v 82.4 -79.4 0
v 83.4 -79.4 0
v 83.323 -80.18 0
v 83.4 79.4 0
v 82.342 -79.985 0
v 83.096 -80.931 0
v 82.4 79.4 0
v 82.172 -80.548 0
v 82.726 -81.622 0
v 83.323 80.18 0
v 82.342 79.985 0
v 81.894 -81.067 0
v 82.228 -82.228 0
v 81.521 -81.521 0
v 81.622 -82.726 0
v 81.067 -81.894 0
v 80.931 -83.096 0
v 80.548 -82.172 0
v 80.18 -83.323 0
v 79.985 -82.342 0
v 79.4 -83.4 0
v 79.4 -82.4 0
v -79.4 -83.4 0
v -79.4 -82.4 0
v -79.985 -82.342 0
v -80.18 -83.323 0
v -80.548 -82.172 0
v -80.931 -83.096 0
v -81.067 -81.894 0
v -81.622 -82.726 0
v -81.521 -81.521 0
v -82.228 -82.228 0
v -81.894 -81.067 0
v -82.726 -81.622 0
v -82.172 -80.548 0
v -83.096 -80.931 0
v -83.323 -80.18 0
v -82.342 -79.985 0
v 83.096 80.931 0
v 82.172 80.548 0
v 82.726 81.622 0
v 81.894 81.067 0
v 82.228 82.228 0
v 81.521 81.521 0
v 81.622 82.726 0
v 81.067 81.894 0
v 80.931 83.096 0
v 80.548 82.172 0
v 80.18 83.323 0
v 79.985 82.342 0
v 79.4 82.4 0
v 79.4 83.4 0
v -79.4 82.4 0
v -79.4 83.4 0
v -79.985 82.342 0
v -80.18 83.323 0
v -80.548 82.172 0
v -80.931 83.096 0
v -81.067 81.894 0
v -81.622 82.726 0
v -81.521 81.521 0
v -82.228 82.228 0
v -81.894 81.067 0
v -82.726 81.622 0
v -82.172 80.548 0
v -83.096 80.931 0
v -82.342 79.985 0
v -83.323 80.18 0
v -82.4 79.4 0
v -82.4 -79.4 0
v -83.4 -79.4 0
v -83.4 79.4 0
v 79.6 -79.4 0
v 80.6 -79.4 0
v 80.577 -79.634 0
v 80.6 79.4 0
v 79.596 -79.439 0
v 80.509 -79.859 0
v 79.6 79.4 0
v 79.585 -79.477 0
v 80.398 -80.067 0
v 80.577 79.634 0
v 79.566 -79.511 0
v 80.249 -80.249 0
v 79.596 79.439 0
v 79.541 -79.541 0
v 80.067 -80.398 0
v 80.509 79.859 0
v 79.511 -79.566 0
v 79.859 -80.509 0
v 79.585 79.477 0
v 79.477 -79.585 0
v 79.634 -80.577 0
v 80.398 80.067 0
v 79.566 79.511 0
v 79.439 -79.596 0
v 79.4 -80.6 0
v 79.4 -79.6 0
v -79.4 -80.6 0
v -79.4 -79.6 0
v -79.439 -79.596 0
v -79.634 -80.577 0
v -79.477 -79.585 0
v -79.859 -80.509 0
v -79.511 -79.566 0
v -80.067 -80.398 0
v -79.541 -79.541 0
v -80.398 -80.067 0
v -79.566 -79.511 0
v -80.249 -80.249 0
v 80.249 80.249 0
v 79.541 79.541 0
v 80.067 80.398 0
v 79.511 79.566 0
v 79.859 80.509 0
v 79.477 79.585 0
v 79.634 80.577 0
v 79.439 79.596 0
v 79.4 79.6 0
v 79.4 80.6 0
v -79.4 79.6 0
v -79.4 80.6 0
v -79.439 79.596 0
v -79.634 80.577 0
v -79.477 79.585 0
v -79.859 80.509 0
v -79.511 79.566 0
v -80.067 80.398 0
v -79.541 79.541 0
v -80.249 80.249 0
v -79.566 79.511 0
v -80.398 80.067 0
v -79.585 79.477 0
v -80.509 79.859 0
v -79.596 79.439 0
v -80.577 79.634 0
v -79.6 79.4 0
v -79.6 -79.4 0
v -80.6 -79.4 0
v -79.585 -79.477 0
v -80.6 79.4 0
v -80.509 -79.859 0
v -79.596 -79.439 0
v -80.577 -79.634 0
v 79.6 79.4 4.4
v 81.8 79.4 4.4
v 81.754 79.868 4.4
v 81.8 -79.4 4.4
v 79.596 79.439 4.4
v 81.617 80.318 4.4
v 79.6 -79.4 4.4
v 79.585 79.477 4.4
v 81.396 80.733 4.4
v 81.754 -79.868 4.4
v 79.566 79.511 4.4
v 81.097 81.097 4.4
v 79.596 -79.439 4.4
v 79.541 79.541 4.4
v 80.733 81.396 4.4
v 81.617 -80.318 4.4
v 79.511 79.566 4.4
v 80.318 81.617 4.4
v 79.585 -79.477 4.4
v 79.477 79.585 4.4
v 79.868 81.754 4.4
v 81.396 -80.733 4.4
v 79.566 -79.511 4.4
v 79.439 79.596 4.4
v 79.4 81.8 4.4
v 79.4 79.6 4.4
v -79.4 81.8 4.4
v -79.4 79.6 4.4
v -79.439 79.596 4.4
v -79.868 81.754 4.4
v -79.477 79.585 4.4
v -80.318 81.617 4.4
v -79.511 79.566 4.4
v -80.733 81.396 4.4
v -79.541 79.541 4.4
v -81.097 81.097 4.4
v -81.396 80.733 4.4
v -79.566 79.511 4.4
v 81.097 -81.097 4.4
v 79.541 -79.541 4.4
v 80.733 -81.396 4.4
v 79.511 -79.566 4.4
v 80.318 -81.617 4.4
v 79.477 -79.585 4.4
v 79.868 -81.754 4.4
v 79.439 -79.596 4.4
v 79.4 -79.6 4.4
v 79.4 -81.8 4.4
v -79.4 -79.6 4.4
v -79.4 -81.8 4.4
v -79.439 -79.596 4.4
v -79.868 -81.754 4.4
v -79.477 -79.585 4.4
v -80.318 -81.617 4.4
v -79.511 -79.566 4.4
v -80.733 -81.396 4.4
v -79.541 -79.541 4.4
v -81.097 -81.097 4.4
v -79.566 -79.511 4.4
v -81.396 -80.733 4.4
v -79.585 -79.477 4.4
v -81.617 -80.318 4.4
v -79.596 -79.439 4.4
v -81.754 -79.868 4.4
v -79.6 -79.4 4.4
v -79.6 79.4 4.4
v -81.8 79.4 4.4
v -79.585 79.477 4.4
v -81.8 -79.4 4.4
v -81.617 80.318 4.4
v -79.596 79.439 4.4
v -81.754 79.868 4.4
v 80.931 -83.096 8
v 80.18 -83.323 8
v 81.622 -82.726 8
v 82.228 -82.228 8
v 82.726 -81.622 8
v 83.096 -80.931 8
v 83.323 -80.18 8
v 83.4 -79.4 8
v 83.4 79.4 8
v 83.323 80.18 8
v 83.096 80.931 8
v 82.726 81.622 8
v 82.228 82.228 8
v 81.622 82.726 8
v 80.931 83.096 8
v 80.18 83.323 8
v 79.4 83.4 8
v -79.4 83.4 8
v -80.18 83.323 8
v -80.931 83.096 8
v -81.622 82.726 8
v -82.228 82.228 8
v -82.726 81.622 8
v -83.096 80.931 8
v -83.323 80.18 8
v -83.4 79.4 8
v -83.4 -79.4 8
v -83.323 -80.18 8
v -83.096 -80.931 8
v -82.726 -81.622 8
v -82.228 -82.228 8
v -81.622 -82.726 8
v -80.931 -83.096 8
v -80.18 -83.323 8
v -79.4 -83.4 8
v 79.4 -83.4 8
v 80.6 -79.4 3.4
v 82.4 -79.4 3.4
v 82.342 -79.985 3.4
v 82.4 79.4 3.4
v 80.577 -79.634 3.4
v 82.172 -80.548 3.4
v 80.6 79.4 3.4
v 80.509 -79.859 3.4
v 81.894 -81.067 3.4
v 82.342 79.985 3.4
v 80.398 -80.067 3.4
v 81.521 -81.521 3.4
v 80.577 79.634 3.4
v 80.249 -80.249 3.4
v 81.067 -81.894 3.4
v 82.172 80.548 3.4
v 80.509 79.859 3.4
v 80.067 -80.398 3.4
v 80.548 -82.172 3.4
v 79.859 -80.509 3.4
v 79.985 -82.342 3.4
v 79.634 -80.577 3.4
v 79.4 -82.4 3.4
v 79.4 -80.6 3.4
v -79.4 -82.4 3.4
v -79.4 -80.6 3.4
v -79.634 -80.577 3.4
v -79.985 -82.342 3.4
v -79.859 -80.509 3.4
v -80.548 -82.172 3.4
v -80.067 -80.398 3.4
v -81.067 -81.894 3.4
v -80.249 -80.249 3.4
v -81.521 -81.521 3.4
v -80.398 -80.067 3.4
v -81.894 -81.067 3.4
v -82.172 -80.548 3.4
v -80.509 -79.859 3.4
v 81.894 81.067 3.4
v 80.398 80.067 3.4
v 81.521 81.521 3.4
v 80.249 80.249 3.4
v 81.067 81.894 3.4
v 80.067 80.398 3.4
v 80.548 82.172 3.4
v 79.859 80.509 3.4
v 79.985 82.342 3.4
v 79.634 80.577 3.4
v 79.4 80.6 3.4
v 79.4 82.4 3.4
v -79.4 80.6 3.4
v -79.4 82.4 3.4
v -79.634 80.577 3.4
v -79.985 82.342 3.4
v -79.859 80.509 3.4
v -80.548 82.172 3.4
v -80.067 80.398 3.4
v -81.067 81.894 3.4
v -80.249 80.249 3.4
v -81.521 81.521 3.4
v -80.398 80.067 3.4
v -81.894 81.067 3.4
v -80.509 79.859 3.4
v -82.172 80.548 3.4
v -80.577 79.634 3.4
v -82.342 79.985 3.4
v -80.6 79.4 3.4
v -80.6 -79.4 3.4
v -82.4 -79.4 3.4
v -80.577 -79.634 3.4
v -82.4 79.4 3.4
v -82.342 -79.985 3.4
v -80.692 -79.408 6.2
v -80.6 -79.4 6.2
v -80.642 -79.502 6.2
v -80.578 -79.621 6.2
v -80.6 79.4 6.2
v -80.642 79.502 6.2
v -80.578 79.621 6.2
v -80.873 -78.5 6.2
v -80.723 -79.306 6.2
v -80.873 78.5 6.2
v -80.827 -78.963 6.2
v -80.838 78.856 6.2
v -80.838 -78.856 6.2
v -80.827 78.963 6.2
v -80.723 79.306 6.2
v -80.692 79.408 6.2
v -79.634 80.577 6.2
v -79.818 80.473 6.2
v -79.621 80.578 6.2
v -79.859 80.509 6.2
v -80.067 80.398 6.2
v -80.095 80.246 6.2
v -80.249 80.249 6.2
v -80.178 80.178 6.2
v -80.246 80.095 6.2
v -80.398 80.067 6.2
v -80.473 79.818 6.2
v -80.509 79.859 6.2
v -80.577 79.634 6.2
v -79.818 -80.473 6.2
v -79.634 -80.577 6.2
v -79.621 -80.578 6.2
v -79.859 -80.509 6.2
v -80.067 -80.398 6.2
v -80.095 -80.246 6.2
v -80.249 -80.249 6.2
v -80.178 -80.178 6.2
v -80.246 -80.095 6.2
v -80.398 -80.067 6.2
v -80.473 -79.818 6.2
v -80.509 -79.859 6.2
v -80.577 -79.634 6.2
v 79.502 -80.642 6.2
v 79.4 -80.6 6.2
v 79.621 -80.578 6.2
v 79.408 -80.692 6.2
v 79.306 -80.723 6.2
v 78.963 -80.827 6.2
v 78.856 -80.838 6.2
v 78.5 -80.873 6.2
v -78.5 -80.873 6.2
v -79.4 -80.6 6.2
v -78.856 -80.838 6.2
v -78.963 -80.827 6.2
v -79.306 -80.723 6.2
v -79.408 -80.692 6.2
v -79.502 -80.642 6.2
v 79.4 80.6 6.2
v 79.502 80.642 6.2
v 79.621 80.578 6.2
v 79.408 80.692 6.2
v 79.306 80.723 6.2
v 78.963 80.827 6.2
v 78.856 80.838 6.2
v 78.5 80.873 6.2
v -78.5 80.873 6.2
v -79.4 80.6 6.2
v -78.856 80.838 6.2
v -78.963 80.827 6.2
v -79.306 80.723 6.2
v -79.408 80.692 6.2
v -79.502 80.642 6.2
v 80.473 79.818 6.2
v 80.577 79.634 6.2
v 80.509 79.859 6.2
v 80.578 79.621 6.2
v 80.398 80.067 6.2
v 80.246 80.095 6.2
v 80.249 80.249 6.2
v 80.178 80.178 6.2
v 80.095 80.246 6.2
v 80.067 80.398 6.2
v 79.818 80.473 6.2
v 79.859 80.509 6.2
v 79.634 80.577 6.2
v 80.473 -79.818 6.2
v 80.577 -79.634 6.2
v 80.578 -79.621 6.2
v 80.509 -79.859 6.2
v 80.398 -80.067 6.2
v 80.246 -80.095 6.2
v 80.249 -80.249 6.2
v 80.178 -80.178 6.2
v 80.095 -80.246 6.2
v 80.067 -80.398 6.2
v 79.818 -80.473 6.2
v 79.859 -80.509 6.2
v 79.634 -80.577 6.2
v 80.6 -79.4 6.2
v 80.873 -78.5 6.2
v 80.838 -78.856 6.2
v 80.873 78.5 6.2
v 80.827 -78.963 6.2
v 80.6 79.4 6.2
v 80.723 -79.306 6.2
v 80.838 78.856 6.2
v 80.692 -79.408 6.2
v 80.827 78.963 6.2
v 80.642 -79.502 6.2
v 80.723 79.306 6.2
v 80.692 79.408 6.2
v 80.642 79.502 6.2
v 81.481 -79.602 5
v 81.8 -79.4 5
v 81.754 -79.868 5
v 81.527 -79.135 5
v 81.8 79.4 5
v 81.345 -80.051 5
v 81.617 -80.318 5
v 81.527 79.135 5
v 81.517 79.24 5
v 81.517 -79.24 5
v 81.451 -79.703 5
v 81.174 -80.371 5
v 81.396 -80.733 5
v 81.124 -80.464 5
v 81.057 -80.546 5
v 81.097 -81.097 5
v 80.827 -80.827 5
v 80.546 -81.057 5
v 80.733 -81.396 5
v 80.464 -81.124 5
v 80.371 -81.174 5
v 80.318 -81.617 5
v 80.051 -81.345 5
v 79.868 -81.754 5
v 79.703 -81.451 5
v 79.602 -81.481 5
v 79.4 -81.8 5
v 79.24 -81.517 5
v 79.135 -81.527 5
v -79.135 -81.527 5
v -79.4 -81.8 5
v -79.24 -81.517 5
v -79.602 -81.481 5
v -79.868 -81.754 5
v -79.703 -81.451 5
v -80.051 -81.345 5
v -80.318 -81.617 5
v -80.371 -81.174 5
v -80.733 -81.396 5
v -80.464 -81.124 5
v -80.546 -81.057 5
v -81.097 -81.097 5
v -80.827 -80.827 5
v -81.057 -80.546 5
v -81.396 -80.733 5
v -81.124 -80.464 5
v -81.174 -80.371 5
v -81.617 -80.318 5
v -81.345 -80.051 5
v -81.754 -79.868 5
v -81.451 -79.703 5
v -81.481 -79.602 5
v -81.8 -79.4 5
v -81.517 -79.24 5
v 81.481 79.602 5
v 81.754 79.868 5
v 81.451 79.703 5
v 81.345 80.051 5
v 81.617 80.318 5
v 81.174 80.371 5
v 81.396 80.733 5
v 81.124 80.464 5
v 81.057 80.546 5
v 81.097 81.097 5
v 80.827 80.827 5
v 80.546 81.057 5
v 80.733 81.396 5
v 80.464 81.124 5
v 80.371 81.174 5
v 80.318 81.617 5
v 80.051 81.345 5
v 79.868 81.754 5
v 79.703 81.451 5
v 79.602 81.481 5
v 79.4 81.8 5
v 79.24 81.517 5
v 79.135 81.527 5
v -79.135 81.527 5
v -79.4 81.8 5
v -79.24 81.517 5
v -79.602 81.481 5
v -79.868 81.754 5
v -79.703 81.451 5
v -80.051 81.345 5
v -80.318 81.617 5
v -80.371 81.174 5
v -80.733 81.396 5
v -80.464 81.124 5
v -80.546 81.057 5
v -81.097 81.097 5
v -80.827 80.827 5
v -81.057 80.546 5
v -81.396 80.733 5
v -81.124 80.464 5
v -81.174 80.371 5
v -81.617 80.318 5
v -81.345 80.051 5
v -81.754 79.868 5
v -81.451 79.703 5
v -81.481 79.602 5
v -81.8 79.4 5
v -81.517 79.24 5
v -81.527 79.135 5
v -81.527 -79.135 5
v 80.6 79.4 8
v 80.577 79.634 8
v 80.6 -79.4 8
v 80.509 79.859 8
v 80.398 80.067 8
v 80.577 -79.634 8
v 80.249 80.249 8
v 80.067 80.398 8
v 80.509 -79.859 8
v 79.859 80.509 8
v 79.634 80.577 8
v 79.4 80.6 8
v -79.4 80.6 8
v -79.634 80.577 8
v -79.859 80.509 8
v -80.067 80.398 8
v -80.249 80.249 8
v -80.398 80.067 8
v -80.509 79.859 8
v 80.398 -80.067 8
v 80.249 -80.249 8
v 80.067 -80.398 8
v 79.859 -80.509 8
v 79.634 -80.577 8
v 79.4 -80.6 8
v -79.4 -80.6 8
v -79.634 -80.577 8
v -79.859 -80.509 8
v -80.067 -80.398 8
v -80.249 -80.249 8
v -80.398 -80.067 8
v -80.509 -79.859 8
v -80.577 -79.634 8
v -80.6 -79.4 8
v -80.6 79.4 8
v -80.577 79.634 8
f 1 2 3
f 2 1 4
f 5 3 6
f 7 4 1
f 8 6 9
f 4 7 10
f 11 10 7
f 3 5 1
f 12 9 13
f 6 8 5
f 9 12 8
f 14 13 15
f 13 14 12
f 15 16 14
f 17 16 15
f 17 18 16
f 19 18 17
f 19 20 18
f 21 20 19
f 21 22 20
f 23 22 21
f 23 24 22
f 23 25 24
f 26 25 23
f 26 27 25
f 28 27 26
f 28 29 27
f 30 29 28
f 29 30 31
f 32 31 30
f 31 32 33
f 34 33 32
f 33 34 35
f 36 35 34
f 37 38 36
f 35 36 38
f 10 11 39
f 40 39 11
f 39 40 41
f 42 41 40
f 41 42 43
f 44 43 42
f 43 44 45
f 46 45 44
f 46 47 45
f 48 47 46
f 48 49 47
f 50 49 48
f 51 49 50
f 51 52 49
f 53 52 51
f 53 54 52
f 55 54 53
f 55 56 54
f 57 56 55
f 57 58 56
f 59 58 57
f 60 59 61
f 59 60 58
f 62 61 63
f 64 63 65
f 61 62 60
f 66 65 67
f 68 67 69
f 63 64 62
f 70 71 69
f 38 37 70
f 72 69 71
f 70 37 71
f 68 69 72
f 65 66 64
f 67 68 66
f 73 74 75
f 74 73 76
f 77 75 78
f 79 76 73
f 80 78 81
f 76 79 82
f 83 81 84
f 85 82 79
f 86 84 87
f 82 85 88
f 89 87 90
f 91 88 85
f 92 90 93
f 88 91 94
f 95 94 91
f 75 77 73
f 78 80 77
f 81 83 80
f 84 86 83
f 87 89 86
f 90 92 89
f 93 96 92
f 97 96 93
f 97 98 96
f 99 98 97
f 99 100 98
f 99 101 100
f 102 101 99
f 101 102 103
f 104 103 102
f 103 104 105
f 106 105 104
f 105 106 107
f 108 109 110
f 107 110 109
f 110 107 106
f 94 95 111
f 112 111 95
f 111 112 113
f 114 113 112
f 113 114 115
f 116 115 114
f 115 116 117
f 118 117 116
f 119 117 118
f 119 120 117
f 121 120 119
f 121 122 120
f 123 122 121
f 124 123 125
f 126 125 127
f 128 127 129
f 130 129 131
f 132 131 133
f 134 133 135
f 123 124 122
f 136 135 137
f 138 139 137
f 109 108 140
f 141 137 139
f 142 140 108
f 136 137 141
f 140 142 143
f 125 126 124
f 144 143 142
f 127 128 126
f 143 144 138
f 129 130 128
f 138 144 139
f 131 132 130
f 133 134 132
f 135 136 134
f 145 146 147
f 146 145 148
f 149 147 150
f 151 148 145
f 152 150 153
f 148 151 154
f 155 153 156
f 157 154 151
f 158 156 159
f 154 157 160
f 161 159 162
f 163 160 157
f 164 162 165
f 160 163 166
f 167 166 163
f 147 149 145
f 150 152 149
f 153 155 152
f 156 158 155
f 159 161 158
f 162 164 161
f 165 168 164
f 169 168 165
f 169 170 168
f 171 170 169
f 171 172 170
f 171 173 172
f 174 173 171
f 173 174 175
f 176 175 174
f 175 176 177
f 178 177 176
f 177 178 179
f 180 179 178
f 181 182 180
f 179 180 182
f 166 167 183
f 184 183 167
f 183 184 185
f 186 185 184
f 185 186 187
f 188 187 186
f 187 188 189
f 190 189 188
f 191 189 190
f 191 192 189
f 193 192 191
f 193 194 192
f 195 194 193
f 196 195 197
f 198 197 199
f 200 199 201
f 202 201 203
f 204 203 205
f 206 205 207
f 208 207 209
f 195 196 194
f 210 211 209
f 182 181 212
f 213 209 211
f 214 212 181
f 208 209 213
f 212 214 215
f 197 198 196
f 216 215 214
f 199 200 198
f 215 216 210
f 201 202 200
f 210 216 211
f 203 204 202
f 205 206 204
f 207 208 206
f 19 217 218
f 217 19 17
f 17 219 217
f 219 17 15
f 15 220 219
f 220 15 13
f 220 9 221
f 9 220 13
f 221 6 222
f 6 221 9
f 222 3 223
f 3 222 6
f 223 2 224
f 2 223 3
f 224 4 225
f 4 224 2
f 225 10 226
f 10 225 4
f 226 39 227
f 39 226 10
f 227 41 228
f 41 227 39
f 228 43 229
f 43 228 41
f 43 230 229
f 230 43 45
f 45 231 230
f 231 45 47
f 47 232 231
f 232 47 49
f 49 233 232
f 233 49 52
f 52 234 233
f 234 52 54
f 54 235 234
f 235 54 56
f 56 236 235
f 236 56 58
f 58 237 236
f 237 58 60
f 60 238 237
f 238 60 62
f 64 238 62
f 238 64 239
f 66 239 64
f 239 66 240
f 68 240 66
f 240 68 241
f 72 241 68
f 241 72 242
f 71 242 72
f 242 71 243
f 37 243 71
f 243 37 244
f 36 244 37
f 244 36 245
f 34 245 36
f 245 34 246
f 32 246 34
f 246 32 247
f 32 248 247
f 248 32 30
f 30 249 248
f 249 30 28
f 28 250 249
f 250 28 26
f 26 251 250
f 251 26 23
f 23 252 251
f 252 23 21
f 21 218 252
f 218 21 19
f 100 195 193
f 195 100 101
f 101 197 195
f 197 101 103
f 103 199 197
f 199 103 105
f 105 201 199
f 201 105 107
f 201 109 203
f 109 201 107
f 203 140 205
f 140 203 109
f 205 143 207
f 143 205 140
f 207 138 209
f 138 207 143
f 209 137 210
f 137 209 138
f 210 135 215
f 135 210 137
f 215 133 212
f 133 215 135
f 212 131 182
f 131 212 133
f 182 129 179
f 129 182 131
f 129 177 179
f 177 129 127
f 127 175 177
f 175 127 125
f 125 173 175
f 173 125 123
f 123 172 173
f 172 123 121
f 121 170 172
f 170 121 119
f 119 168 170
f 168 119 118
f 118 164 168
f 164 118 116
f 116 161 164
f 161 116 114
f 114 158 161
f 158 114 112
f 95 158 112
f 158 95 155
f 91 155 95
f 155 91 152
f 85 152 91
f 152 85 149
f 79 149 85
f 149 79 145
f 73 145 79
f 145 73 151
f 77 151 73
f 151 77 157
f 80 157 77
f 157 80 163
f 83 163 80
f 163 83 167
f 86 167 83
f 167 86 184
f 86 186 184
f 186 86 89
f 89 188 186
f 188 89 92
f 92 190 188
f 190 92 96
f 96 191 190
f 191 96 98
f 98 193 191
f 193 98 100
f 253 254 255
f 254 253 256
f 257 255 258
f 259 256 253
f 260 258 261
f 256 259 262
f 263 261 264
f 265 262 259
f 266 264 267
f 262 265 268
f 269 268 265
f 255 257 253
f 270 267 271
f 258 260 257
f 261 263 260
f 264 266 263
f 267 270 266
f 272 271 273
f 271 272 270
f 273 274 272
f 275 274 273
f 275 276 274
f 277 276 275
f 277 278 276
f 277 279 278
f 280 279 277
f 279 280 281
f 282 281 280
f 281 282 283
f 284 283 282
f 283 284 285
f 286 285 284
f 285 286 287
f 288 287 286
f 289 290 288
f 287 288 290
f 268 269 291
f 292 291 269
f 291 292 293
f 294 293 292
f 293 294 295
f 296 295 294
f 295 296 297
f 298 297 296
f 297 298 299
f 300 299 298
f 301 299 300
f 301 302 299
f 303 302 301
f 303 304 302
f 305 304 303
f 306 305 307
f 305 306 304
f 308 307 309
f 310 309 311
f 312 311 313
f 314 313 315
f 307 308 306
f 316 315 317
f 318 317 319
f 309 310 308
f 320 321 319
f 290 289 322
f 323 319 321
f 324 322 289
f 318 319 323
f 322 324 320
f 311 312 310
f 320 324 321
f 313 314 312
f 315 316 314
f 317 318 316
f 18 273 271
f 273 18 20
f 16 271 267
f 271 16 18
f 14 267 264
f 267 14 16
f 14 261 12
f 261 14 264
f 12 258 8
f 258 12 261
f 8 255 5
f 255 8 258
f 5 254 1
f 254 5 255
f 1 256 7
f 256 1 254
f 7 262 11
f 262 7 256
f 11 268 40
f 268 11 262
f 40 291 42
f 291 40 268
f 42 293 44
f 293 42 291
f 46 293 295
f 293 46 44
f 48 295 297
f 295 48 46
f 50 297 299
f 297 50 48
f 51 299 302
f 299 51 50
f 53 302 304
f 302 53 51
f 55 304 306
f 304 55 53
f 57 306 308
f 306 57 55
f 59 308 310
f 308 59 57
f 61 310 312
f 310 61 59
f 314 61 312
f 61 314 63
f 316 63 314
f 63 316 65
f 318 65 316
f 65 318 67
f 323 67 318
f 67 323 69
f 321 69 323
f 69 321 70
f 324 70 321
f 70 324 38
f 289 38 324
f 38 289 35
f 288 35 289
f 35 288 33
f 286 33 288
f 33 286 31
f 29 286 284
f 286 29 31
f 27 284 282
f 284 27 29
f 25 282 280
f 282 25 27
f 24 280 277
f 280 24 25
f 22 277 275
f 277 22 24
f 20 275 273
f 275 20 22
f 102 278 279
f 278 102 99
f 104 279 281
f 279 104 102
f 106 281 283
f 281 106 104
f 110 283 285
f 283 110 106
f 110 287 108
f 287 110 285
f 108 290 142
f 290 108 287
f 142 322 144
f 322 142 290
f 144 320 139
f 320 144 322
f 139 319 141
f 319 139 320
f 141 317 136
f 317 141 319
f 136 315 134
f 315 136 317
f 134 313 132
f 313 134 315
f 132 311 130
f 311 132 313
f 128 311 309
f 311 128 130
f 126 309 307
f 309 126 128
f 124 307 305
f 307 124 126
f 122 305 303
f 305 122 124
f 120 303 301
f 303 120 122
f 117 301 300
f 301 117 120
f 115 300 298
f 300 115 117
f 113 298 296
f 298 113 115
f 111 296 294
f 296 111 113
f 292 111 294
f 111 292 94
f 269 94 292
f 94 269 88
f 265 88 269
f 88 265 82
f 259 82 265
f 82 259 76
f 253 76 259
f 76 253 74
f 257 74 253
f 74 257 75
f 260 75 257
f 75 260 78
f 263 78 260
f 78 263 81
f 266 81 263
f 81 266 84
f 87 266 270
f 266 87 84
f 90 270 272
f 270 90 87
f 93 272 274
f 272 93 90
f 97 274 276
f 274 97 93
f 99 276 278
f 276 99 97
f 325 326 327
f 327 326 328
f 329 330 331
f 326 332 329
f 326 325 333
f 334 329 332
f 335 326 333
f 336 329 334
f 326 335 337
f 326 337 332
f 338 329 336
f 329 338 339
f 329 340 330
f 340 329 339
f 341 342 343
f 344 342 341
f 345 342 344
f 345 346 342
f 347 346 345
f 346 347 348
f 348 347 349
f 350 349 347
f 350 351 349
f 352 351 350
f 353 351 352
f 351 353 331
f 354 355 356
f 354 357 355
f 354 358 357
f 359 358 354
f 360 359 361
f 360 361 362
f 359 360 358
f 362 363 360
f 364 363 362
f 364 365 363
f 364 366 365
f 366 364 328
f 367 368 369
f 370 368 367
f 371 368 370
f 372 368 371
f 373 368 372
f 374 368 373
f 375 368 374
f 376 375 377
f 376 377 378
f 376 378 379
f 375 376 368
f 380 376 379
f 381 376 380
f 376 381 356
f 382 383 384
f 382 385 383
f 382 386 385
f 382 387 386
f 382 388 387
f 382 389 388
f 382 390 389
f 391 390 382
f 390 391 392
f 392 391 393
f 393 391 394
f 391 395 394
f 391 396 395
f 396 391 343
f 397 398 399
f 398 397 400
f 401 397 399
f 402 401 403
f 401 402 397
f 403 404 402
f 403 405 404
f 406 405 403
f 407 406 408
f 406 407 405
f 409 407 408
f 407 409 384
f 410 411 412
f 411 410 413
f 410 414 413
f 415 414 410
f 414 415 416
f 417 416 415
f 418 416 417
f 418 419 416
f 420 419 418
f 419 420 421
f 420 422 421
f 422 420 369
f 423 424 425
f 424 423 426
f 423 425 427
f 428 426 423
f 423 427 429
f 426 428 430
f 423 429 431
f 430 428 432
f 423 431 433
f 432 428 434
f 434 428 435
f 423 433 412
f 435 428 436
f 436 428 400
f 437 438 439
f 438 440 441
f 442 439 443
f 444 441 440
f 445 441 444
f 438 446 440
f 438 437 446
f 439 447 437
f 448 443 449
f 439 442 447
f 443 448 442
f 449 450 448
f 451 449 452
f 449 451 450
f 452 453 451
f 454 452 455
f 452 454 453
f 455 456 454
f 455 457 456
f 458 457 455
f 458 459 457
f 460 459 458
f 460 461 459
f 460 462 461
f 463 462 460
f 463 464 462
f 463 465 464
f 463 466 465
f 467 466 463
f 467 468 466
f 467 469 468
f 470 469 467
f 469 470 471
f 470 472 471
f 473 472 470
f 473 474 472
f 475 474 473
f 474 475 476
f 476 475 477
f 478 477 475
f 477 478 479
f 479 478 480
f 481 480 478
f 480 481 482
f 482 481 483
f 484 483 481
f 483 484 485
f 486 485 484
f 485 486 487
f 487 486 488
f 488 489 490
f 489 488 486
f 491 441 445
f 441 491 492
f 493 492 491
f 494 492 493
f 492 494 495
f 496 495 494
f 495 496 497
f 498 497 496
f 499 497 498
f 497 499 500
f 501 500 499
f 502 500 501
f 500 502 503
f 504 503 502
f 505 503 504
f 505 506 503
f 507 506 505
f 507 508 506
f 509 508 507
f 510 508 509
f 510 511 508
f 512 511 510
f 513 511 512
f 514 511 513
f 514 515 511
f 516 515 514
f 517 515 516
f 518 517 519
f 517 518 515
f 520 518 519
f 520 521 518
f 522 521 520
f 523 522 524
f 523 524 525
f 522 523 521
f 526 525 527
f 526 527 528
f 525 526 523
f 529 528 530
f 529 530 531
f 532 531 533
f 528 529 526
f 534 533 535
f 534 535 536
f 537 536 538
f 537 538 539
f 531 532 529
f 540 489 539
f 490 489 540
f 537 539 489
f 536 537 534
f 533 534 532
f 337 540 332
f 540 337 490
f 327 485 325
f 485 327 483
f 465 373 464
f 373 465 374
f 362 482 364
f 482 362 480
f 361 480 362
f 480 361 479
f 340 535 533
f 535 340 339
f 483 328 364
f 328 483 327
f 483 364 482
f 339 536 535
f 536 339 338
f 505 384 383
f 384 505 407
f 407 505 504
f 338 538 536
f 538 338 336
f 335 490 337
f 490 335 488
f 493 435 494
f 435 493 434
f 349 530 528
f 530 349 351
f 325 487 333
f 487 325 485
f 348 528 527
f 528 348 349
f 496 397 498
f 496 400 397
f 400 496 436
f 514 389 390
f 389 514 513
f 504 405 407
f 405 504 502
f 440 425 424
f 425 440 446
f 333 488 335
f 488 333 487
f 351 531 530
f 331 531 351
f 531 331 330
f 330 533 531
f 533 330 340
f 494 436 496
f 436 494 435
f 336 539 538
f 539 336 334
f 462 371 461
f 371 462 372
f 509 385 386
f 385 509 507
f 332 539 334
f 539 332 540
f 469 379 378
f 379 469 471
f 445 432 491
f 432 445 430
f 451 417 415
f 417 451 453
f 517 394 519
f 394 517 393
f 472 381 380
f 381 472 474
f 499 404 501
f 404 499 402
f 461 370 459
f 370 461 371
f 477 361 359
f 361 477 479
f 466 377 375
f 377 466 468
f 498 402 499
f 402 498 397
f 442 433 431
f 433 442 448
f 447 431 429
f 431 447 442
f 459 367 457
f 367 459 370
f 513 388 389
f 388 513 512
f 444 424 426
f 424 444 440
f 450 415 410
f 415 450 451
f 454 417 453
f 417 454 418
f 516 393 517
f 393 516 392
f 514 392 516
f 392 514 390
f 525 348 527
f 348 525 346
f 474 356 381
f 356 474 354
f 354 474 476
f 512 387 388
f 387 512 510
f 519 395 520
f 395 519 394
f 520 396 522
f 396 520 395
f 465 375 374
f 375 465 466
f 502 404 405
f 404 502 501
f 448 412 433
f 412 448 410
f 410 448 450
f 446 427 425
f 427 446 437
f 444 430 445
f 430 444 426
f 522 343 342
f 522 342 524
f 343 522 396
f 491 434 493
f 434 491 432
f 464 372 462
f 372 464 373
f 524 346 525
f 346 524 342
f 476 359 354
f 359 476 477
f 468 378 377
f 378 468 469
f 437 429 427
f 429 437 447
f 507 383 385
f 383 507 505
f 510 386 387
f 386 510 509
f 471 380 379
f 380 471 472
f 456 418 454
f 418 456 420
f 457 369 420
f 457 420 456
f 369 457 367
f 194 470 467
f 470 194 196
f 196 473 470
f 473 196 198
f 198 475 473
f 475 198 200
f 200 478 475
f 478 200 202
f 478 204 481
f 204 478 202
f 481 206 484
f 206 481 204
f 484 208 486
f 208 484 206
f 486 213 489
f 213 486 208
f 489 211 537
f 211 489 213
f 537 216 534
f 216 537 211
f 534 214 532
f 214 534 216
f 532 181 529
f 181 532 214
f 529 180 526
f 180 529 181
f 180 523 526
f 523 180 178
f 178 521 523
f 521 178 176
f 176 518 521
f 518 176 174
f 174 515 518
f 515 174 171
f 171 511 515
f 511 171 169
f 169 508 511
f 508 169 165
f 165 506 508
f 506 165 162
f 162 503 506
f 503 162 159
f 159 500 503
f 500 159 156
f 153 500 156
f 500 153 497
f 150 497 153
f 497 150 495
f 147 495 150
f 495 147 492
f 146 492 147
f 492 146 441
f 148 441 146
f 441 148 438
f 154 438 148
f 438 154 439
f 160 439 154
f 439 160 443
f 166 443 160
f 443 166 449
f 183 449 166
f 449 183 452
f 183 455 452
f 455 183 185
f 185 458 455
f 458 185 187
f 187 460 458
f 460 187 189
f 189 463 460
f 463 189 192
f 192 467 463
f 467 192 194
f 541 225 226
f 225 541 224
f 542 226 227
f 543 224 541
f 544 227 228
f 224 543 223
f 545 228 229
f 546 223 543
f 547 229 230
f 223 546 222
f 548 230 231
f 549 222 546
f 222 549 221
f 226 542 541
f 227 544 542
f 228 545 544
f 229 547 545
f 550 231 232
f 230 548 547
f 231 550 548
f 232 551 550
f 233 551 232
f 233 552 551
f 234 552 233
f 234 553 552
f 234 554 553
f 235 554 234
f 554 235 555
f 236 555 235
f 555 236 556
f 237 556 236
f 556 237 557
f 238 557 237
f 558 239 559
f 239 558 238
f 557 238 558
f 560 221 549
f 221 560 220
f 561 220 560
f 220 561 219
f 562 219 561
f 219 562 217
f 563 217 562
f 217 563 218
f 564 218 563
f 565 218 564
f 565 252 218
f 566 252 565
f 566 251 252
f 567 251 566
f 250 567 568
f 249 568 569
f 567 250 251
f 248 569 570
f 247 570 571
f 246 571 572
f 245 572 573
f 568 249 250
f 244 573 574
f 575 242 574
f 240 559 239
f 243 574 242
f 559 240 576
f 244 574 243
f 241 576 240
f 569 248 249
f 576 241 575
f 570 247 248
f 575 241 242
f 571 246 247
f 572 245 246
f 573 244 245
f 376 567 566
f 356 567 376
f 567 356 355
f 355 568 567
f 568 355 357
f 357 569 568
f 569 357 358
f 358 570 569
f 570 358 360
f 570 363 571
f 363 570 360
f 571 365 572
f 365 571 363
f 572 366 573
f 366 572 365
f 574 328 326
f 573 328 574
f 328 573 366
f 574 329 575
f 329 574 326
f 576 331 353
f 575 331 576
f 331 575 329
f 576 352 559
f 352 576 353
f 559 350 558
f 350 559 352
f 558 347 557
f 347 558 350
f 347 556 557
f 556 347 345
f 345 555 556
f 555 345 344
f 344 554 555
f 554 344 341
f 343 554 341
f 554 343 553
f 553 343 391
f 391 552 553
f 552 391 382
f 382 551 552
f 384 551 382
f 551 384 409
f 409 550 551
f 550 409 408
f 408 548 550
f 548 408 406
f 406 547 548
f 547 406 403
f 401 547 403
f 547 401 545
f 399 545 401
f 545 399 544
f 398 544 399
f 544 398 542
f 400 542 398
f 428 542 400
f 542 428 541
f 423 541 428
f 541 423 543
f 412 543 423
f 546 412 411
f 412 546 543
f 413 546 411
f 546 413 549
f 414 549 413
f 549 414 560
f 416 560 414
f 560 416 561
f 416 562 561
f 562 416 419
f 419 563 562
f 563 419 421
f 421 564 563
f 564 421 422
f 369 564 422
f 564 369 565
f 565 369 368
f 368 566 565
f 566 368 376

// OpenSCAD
// A cube lamp that uses one 16x16 WS2812B panel driven by a Eternaglo Pico
// running RNDL firmware. The electrical hardware is USB C powered and sources
// the 5V supply and current for driving the LEDs.
//
// The lamp is composed of two pieces. The base and the shroud. The base
// holds the LED panel, electronics, and a mates to the shroud. The electronics
// sit beaneat the panel on a pressure-fit rectangular mount. The USB C port
// is exposed through this frame so it is parallel to the frame and center.
// The top of the frame is a narrow permiter pin that mates into the shroud's
// receiving slot.
//
// The shroud is printed as a vase to mate onto the frame such that the shroud's
// slot sits around the frame's pin permiter.
//    _                   _
//  _| |_  <-- Frame   |_| |_|   <-- shroud
//
//     +---------------+
//    /              / |
//   /              /  |
//  /              /   |
// +--------------+    |
// |              |    +
// |              |   //
// |              |  //
// |              | //
// |              |//
// +--------------+/
// +==============+/
//--------------------------------------------------------------------------
// Dimensions mm:
// WS2812B
//    Length: 160
//    Width : 160
//    Height:   8 (includes clearance for wiring)
//
// Eternaglo:
//    PCB:
//      Length: 36
//      Width:  17
//      Height:  4
//    Assembled:
//      USB-C from edge of PCB: 4
//      USB thickenest point:  15
//         ____________________
//      / |                    |
// Wire | |                    |]  <-- USB C extends from board edge
//      \ |____________________|
//--------------------------------------------------------------------------
//
// Configuration:
base_length = 160.0; // mm, nominal panel opening (length)
base_width = 160.0; // mm, nominal panel opening (width)

shroud_height = 8.0; // mm

// LED panel -----------------------------------------------------------------
panel_height = 8.0; // mm, includes clearance for wiring beneath the panel
panel_fit_clearance = 0.4; // mm, total clearance so the panel drops into the frame
panel_top_clearance = 0.5; // mm, gap above the panel before the top rim/pin

// Eternaglo Pico controller board --------------------------------------------
pcb_length = 36.0; // mm
pcb_width = 17.0; // mm
pcb_height = 4.0; // mm, bare PCB thickness
pcb_fit_interference = 1.2; // mm, total: sets the mount's grip width (pcb_width - this).
                             // Backed off one 0.4mm print line per side from the first test fit.
wire_gap_width = 8.0; // mm, centered gap in the far (wire-side) wall for LED panel wiring to exit
usb_extend = 4.0; // mm, USB-C connector overhang past the PCB edge
usb_assembled_height = 15.0; // mm, thickest point of the assembled board
usb_port_width = 9.0; // mm, clear opening for the USB-C plug
usb_connector_height = 3.0; // mm, measured: total height of the mounted connector
usb_connector_top = 5.0; // mm, measured: connector's top edge above the PCB mounting surface (floor)
usb_port_clearance = 0.6; // mm, total vertical clearance added around the measured connector

// Base frame construction ----------------------------------------------------
wall_thickness = 3.2; // mm, frame side walls
floor_thickness = 2.4; // mm
corner_radius = 4.0; // mm, outer corner fillet
ledge_width = 2.0; // mm, inward step the panel rests on
ledge_thickness = 1.6; // mm, height of the flat panel-support shelf
ledge_chamfer = 2.0; // mm, height of the taper into the ledge (= ledge_width -> 45 degrees, self-supporting)
mount_wall_thickness = 1.6; // mm, PCB press-fit mount walls
mount_wall_overhang = 3.6; // mm, how far the mount walls rise above the PCB top (raised +3mm per test print)
pin_height = 3.0; // mm, mating pin above the frame's top rim
pin_width = 1.4; // mm, radial width of the mating pin

// Panel support pillars: straight vertical posts from the floor up to the
// ledge height, so the 160mm panel span doesn't rely on the perimeter
// ledge alone. No overhangs, so they need no print supports of their own.
support_pillar_size = 6.0; // mm, square cross-section
support_pillar_spacing = 50.0; // mm, grid pitch, centered on the cavity
support_pillar_inset = 20.0; // mm, keep-out margin from the cavity walls
support_mount_clearance = 6.0; // mm, keep-out margin around the PCB mount

// Shroud construction ---------------------------------------------------------
shroud_wall_thickness = 1.6; // mm, single-wall vase shell (above the groove)
groove_wall_thickness = 1.0; // mm, thin retaining walls that form the groove
pin_fit_clearance = 0.2; // mm, per-side radial clearance between pin and groove
pin_seat_clearance = 0.4; // mm, vertical clearance so the shroud seats flush
groove_ceiling = 1.0; // mm, solid roof over the pocket connecting its inner
                      // wall to the outer wall (otherwise it's a detached ring)

// Diffuser lid: a separate thin panel that drops into a lip at the top of
// the shroud. Printed on its own (different filament/thickness than the
// shroud) so diffusion can be tuned independently - thickness is a guess
// until a transmission test print nails it down.
diffuser_thickness = 1.6; // mm, lid panel thickness - tune from a test print
diffuser_fit_clearance = 0.4; // mm, total drop-in clearance around the lid
diffuser_lip_width = 1.2; // mm, bearing ledge width (also sets the 45-degree chamfer height)
diffuser_rim_clearance = 0.2; // mm, vertical clearance above the lid under the retaining rim

// Which part to generate: base/shroud/lid (print), or an assembled preview
// with translucent LED panel / PCB mock-ups for a fit check.
part = "shroud"; // [base:Base (print), shroud:Shroud (print), lid:Diffuser lid (print), preview:Preview assembly]

$fn = 32;

//--------------------------------------------------------------------------
// Derived dimensions
//--------------------------------------------------------------------------
panel_opening_l = base_length + panel_fit_clearance;
panel_opening_w = base_width + panel_fit_clearance;

frame_outer_l = panel_opening_l + 2 * wall_thickness;
frame_outer_w = panel_opening_w + 2 * wall_thickness;

electronics_height = usb_assembled_height;
frame_rim_h = floor_thickness + electronics_height + ledge_thickness
            + panel_height + panel_top_clearance;
frame_total_h = frame_rim_h + pin_height;

// The mating pin sits inset from the frame's OUTER face by just enough to
// let the shroud's groove wall stay flush with the frame's outer surface
// (so the two parts read as one continuous wall once assembled), with the
// rest of its footprint free to land anywhere inside the wall thickness.
pin_outer_margin = groove_wall_thickness + pin_fit_clearance;
pin_outer_half_l = frame_outer_l / 2 - pin_outer_margin;
pin_outer_half_w = frame_outer_w / 2 - pin_outer_margin;

groove_pocket_depth = pin_height + pin_seat_clearance; // how far the pin actually inserts
groove_depth = groove_pocket_depth + groove_ceiling; // total height of the groove block

// Diffuser lid seat, at the top of the shroud. The outer face stays flush
// and straight the whole way up; only the inner face steps in to form the
// lip, via a 45-degree chamfer so it prints without an overhang.
diffuser_chamfer = diffuser_lip_width; // height of the taper (== run, for 45 degrees)
diffuser_rim_height = diffuser_thickness + diffuser_rim_clearance;
shroud_body_inner_l = frame_outer_l - 2 * shroud_wall_thickness; // straight-wall inner opening
shroud_body_inner_w = frame_outer_w - 2 * shroud_wall_thickness;
shroud_body_r = max(corner_radius - shroud_wall_thickness, 0.2);
diffuser_opening_l = shroud_body_inner_l - 2 * diffuser_lip_width; // opening at the lip
diffuser_opening_w = shroud_body_inner_w - 2 * diffuser_lip_width;
diffuser_opening_r = max(shroud_body_r - diffuser_lip_width, 0.2);
diffuser_lid_l = diffuser_opening_l - diffuser_fit_clearance; // actual lid panel size
diffuser_lid_w = diffuser_opening_w - diffuser_fit_clearance;
diffuser_lid_r = max(diffuser_opening_r - diffuser_fit_clearance / 2, 0.2);
diffuser_lid_z = shroud_height - diffuser_rim_height; // lid's seated height, in the shroud's local frame

pcb_pocket_len = pcb_length - pcb_fit_interference; // y-span (press-fit)
pcb_pocket_wid = pcb_width - pcb_fit_interference; // x-span (press-fit)

// Mount footprint, for the support pillar grid to steer clear of.
mount_near_y = -panel_opening_w / 2 + usb_extend;
mount_far_y = mount_near_y + pcb_pocket_len + 2 * mount_wall_thickness;
mount_half_w = pcb_pocket_wid / 2 + mount_wall_thickness;

// USB-C cutout envelope, measured from the floor (PCB mounting surface) up.
usb_port_height = usb_connector_height + usb_port_clearance;
usb_port_bottom = (usb_connector_top - usb_connector_height) - usb_port_clearance / 2;

//--------------------------------------------------------------------------
// Helpers
//--------------------------------------------------------------------------

// 2D rectangle with filleted corners, centered at the origin.
module rrect(l, w, r) {
    r_clamped = min(r, min(l, w) / 2 - 0.01);
    if (r_clamped <= 0.05) {
        square([l, w], center = true);
    } else {
        hull() {
            for (x = [-1, 1], y = [-1, 1])
                translate([x * (l / 2 - r_clamped), y * (w / 2 - r_clamped)])
                    circle(r = r_clamped);
        }
    }
}

// 2D picture-frame ring: a rrect(l, w, r) outline of thickness t.
module rring(l, w, r, t) {
    difference() {
        rrect(l, w, r);
        rrect(l - 2 * t, w - 2 * t, r - t);
    }
}

//--------------------------------------------------------------------------
// Base (frame)
//--------------------------------------------------------------------------

// U-shaped press-fit pocket that grips the Eternaglo Pico by its edges,
// open on the USB-C side so the connector and cable are unobstructed.
module pcb_mount() {
    outer_len = pcb_pocket_len + 2 * mount_wall_thickness;
    pocket_depth = pcb_height + mount_wall_overhang;

    translate([0, mount_near_y + outer_len / 2, floor_thickness])
        difference() {
            linear_extrude(height = pocket_depth)
                square([pcb_pocket_wid + 2 * mount_wall_thickness, outer_len], center = true);
            linear_extrude(height = pocket_depth)
                square([pcb_pocket_wid, pcb_pocket_len], center = true);
            // Open the near (USB-facing) end of the U.
            translate([-(pcb_pocket_wid + 1) / 2, -outer_len / 2 - 0.5, -0.5])
                cube([pcb_pocket_wid + 1, mount_wall_thickness + 1, pocket_depth + 1], center = false);
            // Centered gap in the far (wire-side) wall so wiring to the LED panel can exit.
            translate([-wire_gap_width / 2, pcb_pocket_len / 2 - 0.5, -0.5])
                cube([wire_gap_width, mount_wall_thickness + 1, pocket_depth + 1], center = false);
        }
}

// Sparse grid of straight vertical posts from the floor to the ledge height,
// backing up the 160mm panel span against sag. Each post is a simple prism
// with no overhangs, so it prints without any support material of its own;
// the grid skips any point that would land inside the PCB mount footprint.
module support_pillars() {
    pillar_h = electronics_height + ledge_thickness;
    half_l = panel_opening_l / 2 - support_pillar_inset;
    half_w = panel_opening_w / 2 - support_pillar_inset;
    steps_l = floor(half_l / support_pillar_spacing);
    steps_w = floor(half_w / support_pillar_spacing);
    clear_x = mount_half_w + support_mount_clearance + support_pillar_size / 2;
    clear_y_min = mount_near_y - support_mount_clearance - support_pillar_size / 2;
    clear_y_max = mount_far_y + support_mount_clearance + support_pillar_size / 2;

    for (i = [-steps_l : steps_l])
        for (j = [-steps_w : steps_w]) {
            px = i * support_pillar_spacing;
            py = j * support_pillar_spacing;
            if (!(abs(px) < clear_x && py > clear_y_min && py < clear_y_max))
                translate([px, py, floor_thickness + pillar_h / 2])
                    cube([support_pillar_size, support_pillar_size, pillar_h], center = true);
        }
}

module base_frame() {
    difference() {
        union() {
            // Outer shell: floor + walls up to the top rim.
            linear_extrude(height = frame_rim_h)
                rrect(frame_outer_l, frame_outer_w, corner_radius);

            // Narrow mating pin, inset from the outer face (see pin_outer_margin).
            translate([0, 0, frame_rim_h])
                linear_extrude(height = pin_height)
                    rring(2 * pin_outer_half_l, 2 * pin_outer_half_w,
                          max(corner_radius - pin_outer_margin, 0.2), pin_width);
        }

        // Lower electronics cavity (full opening width), stopping short of
        // the ledge to leave room for the chamfer below it.
        translate([0, 0, floor_thickness])
            linear_extrude(height = electronics_height - ledge_chamfer)
                rrect(panel_opening_l, panel_opening_w, max(corner_radius - wall_thickness, 0.3));

        // Chamfer into the ledge at 45 degrees (ledge_chamfer == ledge_width)
        // instead of an abrupt step, so the shelf prints without an overhang.
        translate([0, 0, floor_thickness + electronics_height - ledge_chamfer])
            linear_extrude(height = ledge_chamfer,
                            scale = [(panel_opening_l - 2 * ledge_width) / panel_opening_l,
                                     (panel_opening_w - 2 * ledge_width) / panel_opening_w])
                rrect(panel_opening_l, panel_opening_w, max(corner_radius - wall_thickness, 0.3));

        // Ledge: a flat, constant-width shelf the panel actually rests on.
        translate([0, 0, floor_thickness + electronics_height])
            linear_extrude(height = ledge_thickness)
                rrect(panel_opening_l - 2 * ledge_width, panel_opening_w - 2 * ledge_width,
                      max(corner_radius - wall_thickness - ledge_width, 0.3));

        // Panel cavity (full opening width again) up through the top rim.
        translate([0, 0, floor_thickness + electronics_height + ledge_thickness])
            linear_extrude(height = frame_rim_h - (floor_thickness + electronics_height + ledge_thickness) + 0.1)
                rrect(panel_opening_l, panel_opening_w, max(corner_radius - wall_thickness, 0.3));

        // USB-C cutout through the front wall, centered and parallel to the
        // frame, positioned to the measured connector height above the floor.
        translate([-usb_port_width / 2, -frame_outer_w / 2 - 0.5, floor_thickness + usb_port_bottom])
            cube([usb_port_width, wall_thickness + 1, usb_port_height], center = false);
    }

    pcb_mount();
    support_pillars();
}

//--------------------------------------------------------------------------
// Shroud
//--------------------------------------------------------------------------

module shroud() {
    // The groove is a solid block (outer wall + pin gap + inner wall, all
    // one connected piece) with a BLIND pocket cut from underneath to catch
    // the pin - open at the bottom for assembly, but with a solid ceiling
    // (groove_ceiling) left at the top so the inner wall isn't a separate
    // floating ring, detached from the rest of the shroud.
    a_l = frame_outer_l; // outer surface, flush with the frame
    a_w = frame_outer_w;
    pin_gap = pin_width + 2 * pin_fit_clearance;
    groove_wall_span = 2 * groove_wall_thickness + pin_gap; // full a-to-d thickness

    b_l = a_l - 2 * groove_wall_thickness; // pocket's outer edge
    b_w = a_w - 2 * groove_wall_thickness;

    r_a = corner_radius;
    r_b = max(r_a - groove_wall_thickness, 0.2);

    difference() {
        // Solid groove block - fully connected, no separate floating ring.
        linear_extrude(height = groove_depth)
            rring(a_l, a_w, r_a, groove_wall_span);

        // Blind pocket for the pin, cut from underneath only.
        translate([0, 0, -0.5])
            linear_extrude(height = groove_pocket_depth + 0.5)
                rring(b_l, b_w, r_b, pin_gap);
    }

    // Straight body above the groove - no taper, flush with the frame -
    // up to where the lid lip starts.
    body_h = shroud_height - groove_depth - diffuser_chamfer - diffuser_rim_height;
    translate([0, 0, groove_depth])
        linear_extrude(height = body_h)
            rring(a_l, a_w, r_a, shroud_wall_thickness);

    // Chamfer into the lid lip at 45 degrees: the outer face stays flush
    // and straight, only the inner face steps inward, so it prints without
    // an overhang (same trick as the base's ledge).
    translate([0, 0, groove_depth + body_h])
        difference() {
            linear_extrude(height = diffuser_chamfer)
                rrect(a_l, a_w, r_a);
            translate([0, 0, -0.5])
                linear_extrude(height = diffuser_chamfer + 1,
                                scale = [diffuser_opening_l / shroud_body_inner_l,
                                         diffuser_opening_w / shroud_body_inner_w])
                    rrect(shroud_body_inner_l, shroud_body_inner_w, shroud_body_r);
        }

    // Retaining rim: holds the lid down and hides its edge, open at the top.
    translate([0, 0, groove_depth + body_h + diffuser_chamfer])
        linear_extrude(height = diffuser_rim_height)
            rring(a_l, a_w, r_a, shroud_wall_thickness + diffuser_lip_width);
}

// Diffuser lid: a thin flat panel that drops into the lip at the top of the
// shroud. Printed as its own part so thickness/filament can be tuned for
// light transmission independent of the shroud.
module diffuser_lid() {
    linear_extrude(height = diffuser_thickness)
        rrect(diffuser_lid_l, diffuser_lid_w, diffuser_lid_r);
}

//--------------------------------------------------------------------------
// Fit-check mock-ups (shown only in "preview")
//--------------------------------------------------------------------------

module panel_mock() {
    translate([0, 0, floor_thickness + electronics_height + ledge_thickness])
        linear_extrude(height = panel_height)
            square([base_length, base_width], center = true);
}

module pcb_mock() {
    near_y = -panel_opening_w / 2 + usb_extend;
    translate([0, 0, floor_thickness]) {
        linear_extrude(height = pcb_height)
            translate([0, near_y + pcb_length / 2])
                square([pcb_width, pcb_length], center = true);
        // USB-C connector overhang, bridging the gap out to the frame wall.
        translate([0, 0, usb_port_bottom])
            linear_extrude(height = usb_port_height)
                translate([0, near_y - usb_extend / 2])
                    square([usb_port_width, usb_extend], center = true);
    }
}

//--------------------------------------------------------------------------
// Render
//--------------------------------------------------------------------------
if (part == "base") {
    base_frame();
} else if (part == "shroud") {
    shroud();
} else if (part == "lid") {
    diffuser_lid();
} else {
    base_frame();
    translate([0, 0, frame_rim_h])
        shroud();
    translate([0, 0, frame_rim_h + diffuser_lid_z])
        diffuser_lid();
    %panel_mock();
    %pcb_mock();
}
